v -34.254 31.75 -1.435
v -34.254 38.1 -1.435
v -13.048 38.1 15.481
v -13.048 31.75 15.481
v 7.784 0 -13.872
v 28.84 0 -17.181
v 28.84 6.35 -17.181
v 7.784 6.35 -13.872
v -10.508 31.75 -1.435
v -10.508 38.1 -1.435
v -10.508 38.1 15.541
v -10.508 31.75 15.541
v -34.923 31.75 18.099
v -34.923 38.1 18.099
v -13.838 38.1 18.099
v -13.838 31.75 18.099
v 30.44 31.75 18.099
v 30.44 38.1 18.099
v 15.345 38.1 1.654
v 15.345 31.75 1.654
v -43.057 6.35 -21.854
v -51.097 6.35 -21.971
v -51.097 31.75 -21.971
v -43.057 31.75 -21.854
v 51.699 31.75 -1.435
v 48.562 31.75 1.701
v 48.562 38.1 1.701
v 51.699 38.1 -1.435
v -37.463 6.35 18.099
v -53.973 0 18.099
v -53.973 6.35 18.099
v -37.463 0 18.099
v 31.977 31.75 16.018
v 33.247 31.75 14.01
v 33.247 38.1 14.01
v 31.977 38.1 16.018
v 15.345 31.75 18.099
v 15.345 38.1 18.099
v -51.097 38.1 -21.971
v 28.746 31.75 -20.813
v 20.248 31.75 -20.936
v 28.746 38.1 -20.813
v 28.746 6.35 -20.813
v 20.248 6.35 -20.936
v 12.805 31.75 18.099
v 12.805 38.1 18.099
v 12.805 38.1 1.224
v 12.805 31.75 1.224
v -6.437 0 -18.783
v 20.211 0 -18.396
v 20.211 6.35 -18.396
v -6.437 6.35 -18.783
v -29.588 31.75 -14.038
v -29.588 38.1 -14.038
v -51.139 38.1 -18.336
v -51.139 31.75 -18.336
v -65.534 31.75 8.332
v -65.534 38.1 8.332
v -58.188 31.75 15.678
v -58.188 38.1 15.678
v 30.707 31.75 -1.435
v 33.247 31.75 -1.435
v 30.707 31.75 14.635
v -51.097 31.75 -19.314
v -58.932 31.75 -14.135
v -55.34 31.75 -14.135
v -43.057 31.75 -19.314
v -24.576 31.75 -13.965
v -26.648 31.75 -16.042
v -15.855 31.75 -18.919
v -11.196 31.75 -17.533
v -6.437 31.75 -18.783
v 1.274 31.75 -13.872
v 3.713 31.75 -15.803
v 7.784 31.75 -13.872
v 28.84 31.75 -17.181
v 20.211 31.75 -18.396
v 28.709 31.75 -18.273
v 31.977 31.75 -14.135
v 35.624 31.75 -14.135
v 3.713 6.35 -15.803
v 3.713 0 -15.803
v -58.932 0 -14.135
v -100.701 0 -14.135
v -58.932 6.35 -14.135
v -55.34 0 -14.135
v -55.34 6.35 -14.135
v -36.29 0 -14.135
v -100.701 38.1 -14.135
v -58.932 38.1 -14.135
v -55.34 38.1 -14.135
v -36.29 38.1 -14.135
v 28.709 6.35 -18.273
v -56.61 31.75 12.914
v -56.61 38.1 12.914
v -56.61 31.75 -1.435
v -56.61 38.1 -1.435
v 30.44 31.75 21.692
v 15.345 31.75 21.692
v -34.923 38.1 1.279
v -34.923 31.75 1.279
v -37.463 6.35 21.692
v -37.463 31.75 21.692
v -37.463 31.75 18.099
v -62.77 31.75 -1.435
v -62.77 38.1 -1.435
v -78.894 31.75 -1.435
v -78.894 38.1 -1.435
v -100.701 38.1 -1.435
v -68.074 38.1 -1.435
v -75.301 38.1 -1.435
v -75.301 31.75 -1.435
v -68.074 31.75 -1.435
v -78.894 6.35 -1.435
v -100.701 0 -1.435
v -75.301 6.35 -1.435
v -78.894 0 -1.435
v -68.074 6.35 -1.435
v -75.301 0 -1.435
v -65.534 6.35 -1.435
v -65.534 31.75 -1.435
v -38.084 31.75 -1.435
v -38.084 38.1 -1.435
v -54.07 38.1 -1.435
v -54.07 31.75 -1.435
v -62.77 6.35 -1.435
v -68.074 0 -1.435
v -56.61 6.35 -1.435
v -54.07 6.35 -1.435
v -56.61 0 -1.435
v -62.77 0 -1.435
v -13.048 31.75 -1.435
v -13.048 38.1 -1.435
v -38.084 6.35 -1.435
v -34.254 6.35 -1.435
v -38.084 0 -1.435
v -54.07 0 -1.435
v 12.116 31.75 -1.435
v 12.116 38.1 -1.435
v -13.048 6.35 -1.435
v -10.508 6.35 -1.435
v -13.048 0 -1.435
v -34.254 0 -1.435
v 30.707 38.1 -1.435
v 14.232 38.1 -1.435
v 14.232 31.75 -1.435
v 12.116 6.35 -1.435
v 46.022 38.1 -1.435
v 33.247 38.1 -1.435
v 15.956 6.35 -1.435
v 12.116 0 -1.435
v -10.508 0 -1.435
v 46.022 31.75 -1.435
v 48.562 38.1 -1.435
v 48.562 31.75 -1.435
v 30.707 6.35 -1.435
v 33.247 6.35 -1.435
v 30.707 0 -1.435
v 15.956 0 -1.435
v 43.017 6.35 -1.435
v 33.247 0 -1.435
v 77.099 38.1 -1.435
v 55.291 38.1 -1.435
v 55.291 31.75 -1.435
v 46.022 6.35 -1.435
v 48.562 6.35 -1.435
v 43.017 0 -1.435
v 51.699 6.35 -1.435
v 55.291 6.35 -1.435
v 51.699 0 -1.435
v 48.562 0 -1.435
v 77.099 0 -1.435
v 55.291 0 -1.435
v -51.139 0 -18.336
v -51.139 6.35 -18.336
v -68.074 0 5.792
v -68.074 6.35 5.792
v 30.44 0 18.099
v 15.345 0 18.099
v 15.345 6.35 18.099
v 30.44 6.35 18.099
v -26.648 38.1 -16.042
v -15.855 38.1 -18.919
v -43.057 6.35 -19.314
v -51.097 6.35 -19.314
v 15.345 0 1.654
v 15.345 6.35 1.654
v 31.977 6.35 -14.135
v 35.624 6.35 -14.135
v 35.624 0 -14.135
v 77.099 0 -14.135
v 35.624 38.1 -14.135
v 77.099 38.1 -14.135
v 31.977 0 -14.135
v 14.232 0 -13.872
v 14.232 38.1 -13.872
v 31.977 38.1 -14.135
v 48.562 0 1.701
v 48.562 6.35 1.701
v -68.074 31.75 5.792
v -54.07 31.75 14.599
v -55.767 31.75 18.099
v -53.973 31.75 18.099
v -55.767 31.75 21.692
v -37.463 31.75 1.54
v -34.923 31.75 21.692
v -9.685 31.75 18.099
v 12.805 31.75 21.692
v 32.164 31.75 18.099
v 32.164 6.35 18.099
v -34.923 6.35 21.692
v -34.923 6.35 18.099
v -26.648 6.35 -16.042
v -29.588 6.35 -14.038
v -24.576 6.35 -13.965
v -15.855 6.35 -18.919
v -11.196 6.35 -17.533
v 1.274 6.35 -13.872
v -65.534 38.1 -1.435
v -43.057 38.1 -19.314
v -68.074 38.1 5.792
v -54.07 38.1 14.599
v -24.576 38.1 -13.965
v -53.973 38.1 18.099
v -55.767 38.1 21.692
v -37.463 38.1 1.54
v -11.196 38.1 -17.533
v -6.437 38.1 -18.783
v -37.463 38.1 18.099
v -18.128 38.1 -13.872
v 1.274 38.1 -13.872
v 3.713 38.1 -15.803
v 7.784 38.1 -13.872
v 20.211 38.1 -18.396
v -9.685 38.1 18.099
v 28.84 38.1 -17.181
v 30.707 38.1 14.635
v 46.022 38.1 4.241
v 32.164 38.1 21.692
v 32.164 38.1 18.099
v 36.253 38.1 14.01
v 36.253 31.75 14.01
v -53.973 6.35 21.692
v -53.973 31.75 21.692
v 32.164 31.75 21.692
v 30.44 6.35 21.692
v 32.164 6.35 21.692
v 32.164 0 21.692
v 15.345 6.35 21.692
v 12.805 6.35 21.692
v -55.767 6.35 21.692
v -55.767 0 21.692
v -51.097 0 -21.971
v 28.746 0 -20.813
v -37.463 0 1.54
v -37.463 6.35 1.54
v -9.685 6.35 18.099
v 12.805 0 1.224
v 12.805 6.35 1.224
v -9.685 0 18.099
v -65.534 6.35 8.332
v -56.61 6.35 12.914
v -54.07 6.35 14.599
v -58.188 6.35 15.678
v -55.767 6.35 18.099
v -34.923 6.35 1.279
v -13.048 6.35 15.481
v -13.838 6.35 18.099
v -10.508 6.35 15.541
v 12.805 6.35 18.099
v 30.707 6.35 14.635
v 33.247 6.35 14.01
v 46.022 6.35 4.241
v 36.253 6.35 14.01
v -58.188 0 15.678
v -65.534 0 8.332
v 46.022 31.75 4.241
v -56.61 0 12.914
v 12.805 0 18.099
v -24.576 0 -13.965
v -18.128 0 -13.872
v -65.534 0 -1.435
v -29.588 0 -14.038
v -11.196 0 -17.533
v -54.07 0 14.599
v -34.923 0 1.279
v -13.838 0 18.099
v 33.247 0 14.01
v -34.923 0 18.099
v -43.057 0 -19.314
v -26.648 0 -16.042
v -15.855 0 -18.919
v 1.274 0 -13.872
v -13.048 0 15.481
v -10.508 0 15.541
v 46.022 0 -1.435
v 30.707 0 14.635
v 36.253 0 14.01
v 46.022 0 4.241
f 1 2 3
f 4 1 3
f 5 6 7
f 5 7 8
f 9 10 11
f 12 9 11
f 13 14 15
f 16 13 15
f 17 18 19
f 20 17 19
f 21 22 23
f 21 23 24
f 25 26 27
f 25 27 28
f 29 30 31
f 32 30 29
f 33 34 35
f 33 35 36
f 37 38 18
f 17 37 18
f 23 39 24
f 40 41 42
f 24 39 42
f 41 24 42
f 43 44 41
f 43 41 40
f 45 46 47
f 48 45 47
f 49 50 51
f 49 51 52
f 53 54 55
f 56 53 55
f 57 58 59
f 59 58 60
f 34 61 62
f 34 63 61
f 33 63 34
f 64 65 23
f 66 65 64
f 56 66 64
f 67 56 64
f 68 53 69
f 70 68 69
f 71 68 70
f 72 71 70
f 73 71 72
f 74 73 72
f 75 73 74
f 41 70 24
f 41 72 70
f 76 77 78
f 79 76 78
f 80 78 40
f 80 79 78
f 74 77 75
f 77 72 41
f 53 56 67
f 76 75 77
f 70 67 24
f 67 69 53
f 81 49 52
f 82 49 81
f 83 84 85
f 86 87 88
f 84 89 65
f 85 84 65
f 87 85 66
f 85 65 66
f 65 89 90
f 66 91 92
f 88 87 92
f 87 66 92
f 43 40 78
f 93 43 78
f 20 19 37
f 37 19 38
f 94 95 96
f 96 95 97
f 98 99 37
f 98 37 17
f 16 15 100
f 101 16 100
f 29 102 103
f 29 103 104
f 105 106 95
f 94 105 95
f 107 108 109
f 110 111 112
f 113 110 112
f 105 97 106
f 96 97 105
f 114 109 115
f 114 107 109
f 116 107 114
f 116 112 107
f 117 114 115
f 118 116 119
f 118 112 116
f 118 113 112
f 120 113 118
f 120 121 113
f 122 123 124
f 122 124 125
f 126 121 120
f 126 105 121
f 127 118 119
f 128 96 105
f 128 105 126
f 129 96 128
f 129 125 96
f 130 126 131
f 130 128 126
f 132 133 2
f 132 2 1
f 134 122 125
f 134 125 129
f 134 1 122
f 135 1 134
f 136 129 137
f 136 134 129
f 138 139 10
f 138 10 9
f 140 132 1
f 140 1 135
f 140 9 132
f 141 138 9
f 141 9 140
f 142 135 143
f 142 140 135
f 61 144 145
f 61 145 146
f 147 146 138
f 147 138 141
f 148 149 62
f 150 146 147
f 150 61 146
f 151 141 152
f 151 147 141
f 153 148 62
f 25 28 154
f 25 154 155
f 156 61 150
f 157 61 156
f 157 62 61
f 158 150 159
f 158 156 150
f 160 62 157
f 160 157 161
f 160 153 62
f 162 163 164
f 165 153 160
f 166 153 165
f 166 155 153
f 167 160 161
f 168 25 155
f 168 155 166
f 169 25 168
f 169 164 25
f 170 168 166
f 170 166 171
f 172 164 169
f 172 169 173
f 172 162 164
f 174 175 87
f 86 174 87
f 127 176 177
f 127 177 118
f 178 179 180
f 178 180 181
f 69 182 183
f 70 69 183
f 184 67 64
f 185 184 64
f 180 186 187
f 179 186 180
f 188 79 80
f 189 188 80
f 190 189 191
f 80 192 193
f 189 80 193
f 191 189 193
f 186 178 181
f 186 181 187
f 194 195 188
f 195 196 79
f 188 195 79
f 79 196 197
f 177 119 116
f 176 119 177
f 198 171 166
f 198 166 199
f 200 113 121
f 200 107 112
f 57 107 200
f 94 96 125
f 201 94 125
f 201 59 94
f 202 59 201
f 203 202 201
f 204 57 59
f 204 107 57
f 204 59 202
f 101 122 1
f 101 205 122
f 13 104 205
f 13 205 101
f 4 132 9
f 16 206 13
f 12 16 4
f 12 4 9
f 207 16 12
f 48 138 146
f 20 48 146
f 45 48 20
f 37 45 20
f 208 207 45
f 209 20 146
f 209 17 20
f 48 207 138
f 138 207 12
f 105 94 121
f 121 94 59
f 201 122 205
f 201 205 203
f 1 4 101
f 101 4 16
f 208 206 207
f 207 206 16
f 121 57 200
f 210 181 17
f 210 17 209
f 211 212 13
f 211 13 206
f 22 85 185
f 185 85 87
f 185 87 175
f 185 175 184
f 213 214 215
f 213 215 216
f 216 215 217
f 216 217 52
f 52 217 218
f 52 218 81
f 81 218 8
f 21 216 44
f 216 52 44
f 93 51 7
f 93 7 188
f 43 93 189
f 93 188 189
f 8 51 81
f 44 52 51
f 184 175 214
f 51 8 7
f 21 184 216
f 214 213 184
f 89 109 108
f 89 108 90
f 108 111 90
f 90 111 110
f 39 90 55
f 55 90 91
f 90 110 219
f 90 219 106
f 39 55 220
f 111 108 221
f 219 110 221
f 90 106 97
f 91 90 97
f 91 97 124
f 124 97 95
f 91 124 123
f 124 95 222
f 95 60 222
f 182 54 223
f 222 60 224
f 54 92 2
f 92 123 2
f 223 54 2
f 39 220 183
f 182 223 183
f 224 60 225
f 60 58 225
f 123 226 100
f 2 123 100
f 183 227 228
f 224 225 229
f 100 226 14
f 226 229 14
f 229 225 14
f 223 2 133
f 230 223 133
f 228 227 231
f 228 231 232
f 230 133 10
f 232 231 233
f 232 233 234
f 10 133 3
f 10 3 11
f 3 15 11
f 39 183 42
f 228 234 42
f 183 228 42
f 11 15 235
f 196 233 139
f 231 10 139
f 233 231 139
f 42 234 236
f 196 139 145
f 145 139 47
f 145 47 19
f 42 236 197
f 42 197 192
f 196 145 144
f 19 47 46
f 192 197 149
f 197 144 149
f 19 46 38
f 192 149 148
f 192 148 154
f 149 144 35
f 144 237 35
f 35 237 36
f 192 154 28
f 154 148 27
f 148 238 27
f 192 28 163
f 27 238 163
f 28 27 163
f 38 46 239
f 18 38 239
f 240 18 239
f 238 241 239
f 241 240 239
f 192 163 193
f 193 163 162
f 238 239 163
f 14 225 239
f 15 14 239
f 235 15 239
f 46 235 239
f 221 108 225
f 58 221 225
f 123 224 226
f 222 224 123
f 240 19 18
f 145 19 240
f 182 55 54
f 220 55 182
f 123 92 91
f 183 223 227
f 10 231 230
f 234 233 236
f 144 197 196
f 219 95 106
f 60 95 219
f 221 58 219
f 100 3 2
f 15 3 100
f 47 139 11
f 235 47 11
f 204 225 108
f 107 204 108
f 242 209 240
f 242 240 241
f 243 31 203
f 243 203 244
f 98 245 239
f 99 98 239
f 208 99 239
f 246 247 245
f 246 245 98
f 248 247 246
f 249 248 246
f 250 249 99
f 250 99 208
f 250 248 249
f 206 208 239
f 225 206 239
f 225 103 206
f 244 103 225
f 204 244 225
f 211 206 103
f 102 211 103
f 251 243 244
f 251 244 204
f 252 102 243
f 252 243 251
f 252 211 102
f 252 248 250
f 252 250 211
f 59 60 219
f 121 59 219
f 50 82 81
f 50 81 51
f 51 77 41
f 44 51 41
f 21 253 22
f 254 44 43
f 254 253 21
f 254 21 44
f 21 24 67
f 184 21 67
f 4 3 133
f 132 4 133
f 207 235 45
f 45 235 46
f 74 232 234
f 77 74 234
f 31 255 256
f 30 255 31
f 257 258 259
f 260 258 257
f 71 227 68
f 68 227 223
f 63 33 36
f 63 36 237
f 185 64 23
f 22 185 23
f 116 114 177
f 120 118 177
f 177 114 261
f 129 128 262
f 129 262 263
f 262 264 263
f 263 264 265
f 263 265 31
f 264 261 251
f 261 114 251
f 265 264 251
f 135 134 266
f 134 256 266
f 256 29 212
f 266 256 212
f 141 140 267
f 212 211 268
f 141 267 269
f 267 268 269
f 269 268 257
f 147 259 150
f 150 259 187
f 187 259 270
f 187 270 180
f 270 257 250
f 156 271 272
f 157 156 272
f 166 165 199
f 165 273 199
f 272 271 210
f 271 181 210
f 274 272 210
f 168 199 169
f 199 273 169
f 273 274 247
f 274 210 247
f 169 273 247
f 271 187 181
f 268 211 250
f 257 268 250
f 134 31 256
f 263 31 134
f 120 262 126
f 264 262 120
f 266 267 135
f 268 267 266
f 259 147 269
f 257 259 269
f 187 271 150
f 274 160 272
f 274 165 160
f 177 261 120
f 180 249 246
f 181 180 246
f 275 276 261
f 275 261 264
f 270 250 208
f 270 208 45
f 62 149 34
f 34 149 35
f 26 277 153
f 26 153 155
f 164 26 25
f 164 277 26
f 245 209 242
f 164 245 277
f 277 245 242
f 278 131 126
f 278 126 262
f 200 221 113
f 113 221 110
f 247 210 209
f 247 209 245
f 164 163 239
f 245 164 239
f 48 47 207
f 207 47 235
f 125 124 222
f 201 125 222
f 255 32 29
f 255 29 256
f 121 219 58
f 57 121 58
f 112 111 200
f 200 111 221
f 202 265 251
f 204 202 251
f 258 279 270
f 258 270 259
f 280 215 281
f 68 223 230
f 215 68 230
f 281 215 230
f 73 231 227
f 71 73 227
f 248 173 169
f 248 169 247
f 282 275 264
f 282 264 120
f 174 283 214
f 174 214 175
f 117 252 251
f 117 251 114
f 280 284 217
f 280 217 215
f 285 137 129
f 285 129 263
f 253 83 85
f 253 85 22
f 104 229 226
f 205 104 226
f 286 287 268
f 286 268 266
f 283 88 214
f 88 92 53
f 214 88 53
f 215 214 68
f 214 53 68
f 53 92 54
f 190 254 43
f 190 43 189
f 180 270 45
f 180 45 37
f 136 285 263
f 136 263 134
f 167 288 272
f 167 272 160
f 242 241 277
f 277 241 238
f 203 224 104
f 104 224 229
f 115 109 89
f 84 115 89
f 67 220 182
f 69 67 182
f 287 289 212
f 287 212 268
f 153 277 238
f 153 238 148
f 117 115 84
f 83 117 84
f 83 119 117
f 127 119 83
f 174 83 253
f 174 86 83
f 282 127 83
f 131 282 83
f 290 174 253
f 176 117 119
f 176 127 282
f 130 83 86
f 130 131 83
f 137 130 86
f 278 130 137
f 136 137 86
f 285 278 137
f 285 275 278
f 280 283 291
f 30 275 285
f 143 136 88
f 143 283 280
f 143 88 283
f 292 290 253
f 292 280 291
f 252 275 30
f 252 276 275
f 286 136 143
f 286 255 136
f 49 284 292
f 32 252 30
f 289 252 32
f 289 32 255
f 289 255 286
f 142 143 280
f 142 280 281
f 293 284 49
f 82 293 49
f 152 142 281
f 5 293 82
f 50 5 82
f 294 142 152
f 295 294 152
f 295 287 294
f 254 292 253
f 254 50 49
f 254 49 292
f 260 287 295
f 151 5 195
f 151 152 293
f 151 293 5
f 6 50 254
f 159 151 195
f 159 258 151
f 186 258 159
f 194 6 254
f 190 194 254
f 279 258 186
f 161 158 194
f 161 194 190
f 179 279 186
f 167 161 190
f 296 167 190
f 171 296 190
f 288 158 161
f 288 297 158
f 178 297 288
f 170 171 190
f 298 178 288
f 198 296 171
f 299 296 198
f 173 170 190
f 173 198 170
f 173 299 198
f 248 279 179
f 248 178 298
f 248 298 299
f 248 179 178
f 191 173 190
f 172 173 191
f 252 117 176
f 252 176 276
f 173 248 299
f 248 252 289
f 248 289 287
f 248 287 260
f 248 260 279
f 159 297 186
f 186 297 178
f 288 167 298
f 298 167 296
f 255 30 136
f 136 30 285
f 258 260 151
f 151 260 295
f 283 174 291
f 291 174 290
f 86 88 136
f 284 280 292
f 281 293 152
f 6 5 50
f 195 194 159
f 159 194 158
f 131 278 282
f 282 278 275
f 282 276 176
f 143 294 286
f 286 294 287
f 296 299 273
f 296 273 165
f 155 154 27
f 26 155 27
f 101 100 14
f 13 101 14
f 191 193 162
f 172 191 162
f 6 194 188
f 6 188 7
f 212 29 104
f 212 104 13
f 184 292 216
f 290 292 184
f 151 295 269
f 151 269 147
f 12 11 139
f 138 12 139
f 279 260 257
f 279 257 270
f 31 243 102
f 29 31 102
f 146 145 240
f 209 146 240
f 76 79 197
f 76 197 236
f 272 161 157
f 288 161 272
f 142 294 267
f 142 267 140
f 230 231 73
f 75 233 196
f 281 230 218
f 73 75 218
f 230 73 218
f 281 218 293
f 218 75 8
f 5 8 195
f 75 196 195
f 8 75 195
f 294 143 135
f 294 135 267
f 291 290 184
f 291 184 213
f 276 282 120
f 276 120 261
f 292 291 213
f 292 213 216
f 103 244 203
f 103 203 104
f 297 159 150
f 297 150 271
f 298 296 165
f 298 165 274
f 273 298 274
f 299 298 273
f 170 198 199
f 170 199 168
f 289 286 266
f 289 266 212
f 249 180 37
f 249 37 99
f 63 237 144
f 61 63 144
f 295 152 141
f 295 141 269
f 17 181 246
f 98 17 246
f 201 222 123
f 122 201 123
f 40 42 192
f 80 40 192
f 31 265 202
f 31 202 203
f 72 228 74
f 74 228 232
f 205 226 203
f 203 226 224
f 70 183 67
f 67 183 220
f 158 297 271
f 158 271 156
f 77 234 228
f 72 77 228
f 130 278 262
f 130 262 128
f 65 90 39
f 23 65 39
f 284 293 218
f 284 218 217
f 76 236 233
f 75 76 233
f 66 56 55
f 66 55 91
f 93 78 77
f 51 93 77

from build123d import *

# Parameters (mm, degrees)
F1_DEPTH  = 19.05
F2_DEPTH  = 19.05
F3_DEPTH  = 12.7
F4_DEPTH  = 6.35
F5_DEPTH  = 6.35
F7_DEPTH  = 6.35
F8_DEPTH  = 6.35
F11_DEPTH = 25.4
F12_DEPTH = 25.4
F6_W      = 1.7239038059
F6_H      = 3.5921024484
F6_W_2    = 1.7933621035
F13_DEPTH = 38.1
F14_DEPTH = 6.35


# Not quite as in the source:
# - a feature names something its author has since deleted; it is built from what else it names


with BuildPart() as f1:
    # F0 (on Front) → F1 (new body)
    with BuildSketch(Plane.XZ):
        Polygon((-75.3014223417, -8.4543359262), (-75.3014223417, -1.435443759), (-78.8935247901, -1.435443759), (-100.7014223417, -1.435443759), (-100.7014223417, -14.135443759), (-75.3014223417, -14.135443759), align=None)
    extrude(amount=-F1_DEPTH)

    # F0 (on Front) → F2 (join)
    with BuildSketch(Plane.XZ):
        Polygon((-68.0739664064, -1.435443759), (-75.3014223417, -1.435443759), (-75.3014223417, -8.4543359262), (-75.3014223417, -14.135443759), (-58.9322418971, -14.135443759), (-55.3401394486, -14.135443759), (-55.3401394486, -1.435443759), (-56.6101394486, -1.435443759), (-62.7698475104, -1.435443759), (-64.1519069584, -1.435443759), (-65.5339664064, -1.435443759), align=None)
        Polygon((-55.3401394486, -1.435443759), (-55.3401394486, -14.135443759), (-36.2901394486, -14.135443759), (-36.2901394486, -1.435443759), (-38.0835015521, -1.435443759), (-54.0701394486, -1.435443759), align=None)
        Polygon((-34.2535879934, -1.435443759), (-36.2901394486, -1.435443759), (-36.2901394486, -14.135443759), (-29.5884479715, -14.0381948012), (-24.5761177188, -13.9654603438), (-18.1276498189, -13.8718859402), (-18.1276498189, -1.435443759), align=None)
    extrude(amount=-F2_DEPTH)



with BuildPart() as f1b:
    # F0 (on Front) → F1, piece 2 (new body)
    with BuildSketch(Plane.XZ):
        Polygon((77.0985776583, -1.435443759), (55.2906801068, -1.435443759), (51.6985776583, -1.435443759), (48.562251594, -1.435443759), (46.022251594, -1.435443759), (44.5195358117, -1.435443759), (43.0168200294, -1.435443759), (33.2472785554, -1.435443759), (31.9772785554, -1.435443759), (31.9772785554, -14.135443759), (35.6239399467, -14.135443759), (77.0985776583, -14.135443759), align=None)
    extrude(amount=-F1_DEPTH)

    # F0 (on Front) → F2, piece 2 (join)
    with BuildSketch(Plane.XZ):
        Polygon((14.2324982387, -13.8718859402), (14.2324982387, -1.435443759), (12.1164883202, -1.435443759), (-5.4276498189, -1.435443759), (-5.4276498189, -13.8718859402), (1.2740385811, -13.8718859402), (7.7840224387, -13.8718859402), align=None)
        Polygon((15.9564020446, -1.435443759), (14.2324982387, -1.435443759), (14.2324982387, -13.8718859402), (31.9772785554, -14.135443759), (31.9772785554, -1.435443759), (30.7072785554, -1.435443759), align=None)
        Polygon((77.0985776583, -1.435443759), (55.2906801068, -1.435443759), (51.6985776583, -1.435443759), (48.562251594, -1.435443759), (46.022251594, -1.435443759), (44.5195358117, -1.435443759), (43.0168200294, -1.435443759), (33.2472785554, -1.435443759), (31.9772785554, -1.435443759), (31.9772785554, -14.135443759), (35.6239399467, -14.135443759), (77.0985776583, -14.135443759), align=None)
    extrude(amount=-F2_DEPTH)


with BuildPart() as f1_1:
    add(f1.part)
    # F3 (add, through all): a face of the model
    f3_faces = [f1b.part.faces().sort_by_distance(p)[0] for p in [
        (-5.4276498189, 9.525, -7.6536648496),
    ]]

    add(f1b.part)  # F3 merges F1b
    extrude(f3_faces, amount=F3_DEPTH)

    # F0 (on Front) → F4 (join)
    with BuildSketch(Plane.XZ):
        Polygon((-78.8935247901, -1.435443759), (-75.3014223417, -1.435443759), (-68.0739664064, 5.7920121763), (-65.5339664064, 8.3320121763), (-58.1879977366, 15.6779808461), (-55.7665104711, 18.0994681116), (-53.9731483676, 18.0994681116), (-37.4634148507, 18.0994681116), (-36.1934148507, 18.0994681116), (-34.9234148507, 18.0994681116), (-13.8379737969, 18.0994681116), (-11.8014223417, 18.0994681116), (-9.6854124232, 18.0994681116), (12.8047038004, 18.0994681116), (14.0747038004, 18.0994681116), (15.3447038004, 18.0994681116), (30.4397619819, 18.0994681116), (32.1636657878, 18.0994681116), (36.2527101199, 14.0104237794), (46.022251594, 4.2408823054), (48.562251594, 1.7008823054), (51.6985776583, -1.435443759), (55.2906801068, -1.435443759), (32.1636657878, 21.69157056), (-55.7665104711, 21.69157056), align=None)
        Polygon((-68.0739664064, 5.7920121763), (-68.0739664064, -1.435443759), (-65.5339664064, -1.435443759), (-65.5339664064, 8.3320121763), align=None)
        Polygon((-36.1934148507, 18.0994681116), (-37.4634148507, 18.0994681116), (-37.4634148507, 1.5401106785), (-36.1934148507, 0.2662933926), align=None)
        Polygon((-34.9234148507, 18.0994681116), (-36.1934148507, 18.0994681116), (-36.1934148507, 0.2662933926), (-34.9234148507, 1.2793859922), align=None)
        Polygon((-11.7776498189, 16.4938528035), (-13.0476498189, 15.4807602039), (-13.0476498189, -1.435443759), (-11.7776498189, -1.435443759), align=None)
        Polygon((-10.5076498189, 15.5408907631), (-11.7776498189, 16.4938528035), (-11.7776498189, -1.435443759), (-10.5076498189, -1.435443759), align=None)
        Polygon((15.3447038004, 18.0994681116), (14.0747038004, 18.0994681116), (14.0747038004, 0.2707367444), (15.3447038004, 1.6543241772), align=None)
        Polygon((14.0747038004, 18.0994681116), (12.8047038004, 18.0994681116), (12.8047038004, 1.2236987848), (14.0747038004, 0.2707367444), align=None)
        Polygon((30.7072785554, -1.435443759), (31.9772785554, -1.435443759), (31.9772785554, 16.0183226994), (30.7072785554, 14.6347352666), align=None)
        Polygon((31.9772785554, 16.0183226994), (31.9772785554, -1.435443759), (33.2472785554, -1.435443759), (33.2472785554, 14.0104237794), align=None)
        Polygon((-55.3401394486, 15.8730630517), (-55.3401394486, -1.435443759), (-54.0701394486, -1.435443759), (-54.0701394486, 14.5992457658), align=None)
        Polygon((-56.6101394486, 12.9144267948), (-56.6101394486, -1.435443759), (-55.3401394486, -1.435443759), (-55.3401394486, 15.8730630517), align=None)
    extrude(amount=-F4_DEPTH)

    # F0 (on Front) → F5 (join)
    with BuildSketch(Plane.XZ):
        Polygon((-55.7665104711, 18.0994681116), (-64.1519069584, -1.435443759), (-62.7698475104, -1.435443759), (-56.6101394486, 12.9144267948), (-55.3401394486, 15.8730630517), (-54.0701394486, 14.5992457658), (-38.0835015521, -1.435443759), (-36.2901394486, -1.435443759), align=None)
        Polygon((-58.1879977366, 15.6779808461), (-65.5339664064, -1.435443759), (-64.1519069584, -1.435443759), (-55.7665104711, 18.0994681116), align=None)
        Polygon((-53.9731483676, 18.0994681116), (-55.7665104711, 18.0994681116), (-36.2901394486, -1.435443759), (-11.8014223417, 18.0994681116), (-13.8379737969, 18.0994681116), (-34.9234148507, 1.2793859922), (-36.1934148507, 0.2662933926), (-37.4634148507, 1.5401106785), align=None)
        Polygon((-11.8014223417, 18.0994681116), (-36.2901394486, -1.435443759), (-34.2535879934, -1.435443759), (-13.0476498189, 15.4807602039), (-11.7776498189, 16.4938528035), (-10.5076498189, 15.5408907631), (12.1164883202, -1.435443759), (14.2324982387, -1.435443759), align=None)
        Polygon((-9.6854124232, 18.0994681116), (-11.8014223417, 18.0994681116), (14.2324982387, -1.435443759), (32.1636657878, 18.0994681116), (30.4397619819, 18.0994681116), (15.3447038004, 1.6543241772), (14.0747038004, 0.2707367444), (12.8047038004, 1.2236987848), align=None)
    extrude(amount=-F5_DEPTH)

    # F0 (on Front) → F7 (join)
    with BuildSketch(Plane.XZ):
        Polygon((-55.3401394486, -14.135443759), (-58.9322418971, -14.135443759), (-51.0965817995, -21.9711038566), (28.7455422806, -20.8125063022), (35.6239399467, -14.135443759), (31.9772785554, -14.135443759), (28.8399389893, -17.1809513785), (27.7001179184, -18.2874091537), (20.2112810939, -18.3960804614), (-6.4368105921, -18.782773754), (-11.1798369081, -18.8516003134), (-15.855044379, -18.9194427462), (-43.0566496336, -19.3141681332), (-50.0597917346, -19.415791473), (-51.1394793261, -18.3361038815), align=None)
        Polygon((-26.606417659, -14.7384993405), (-50.0597917346, -19.415791473), (-43.0566496336, -19.3141681332), (-26.647951981, -16.0417915366), (-15.855044379, -18.9194427462), (-11.1798369081, -18.8516003134), align=None)
        Polygon((-29.5884479715, -14.0381948012), (-51.1394793261, -18.3361038815), (-50.0597917346, -19.415791473), (-26.606417659, -14.7384993405), (-11.1798369081, -18.8516003134), (3.6282092287, -14.5043621946), (27.7001179184, -18.2874091537), (28.8399389893, -17.1809513785), (7.7840224387, -13.8718859402), (1.2740385811, -13.8718859402), (-11.1963136804, -17.5328409511), (-24.5761177188, -13.9654603438), align=None)
        Polygon((3.6282092287, -14.5043621946), (-11.1798369081, -18.8516003134), (-6.4368105921, -18.782773754), (3.7125368777, -15.8032023917), (20.2112810939, -18.3960804614), (27.7001179184, -18.2874091537), align=None)
    extrude(amount=-F7_DEPTH)

    # F0 (on Front) → F8 (join)
    with BuildSketch(Plane.XZ):
        Polygon((46.022251594, -1.435443759), (48.562251594, -1.435443759), (48.562251594, 1.7008823054), (46.022251594, 4.2408823054), align=None)
    extrude(amount=-F8_DEPTH)

    # F9: F1 across face


with BuildPart() as f1_2:
    add(f1_1.part)
    add(f1_1.part.mirror(Plane(origin=(-11.8589412224, 19.05, -7.7486185811), x_dir=(-1, 0, 0), z_dir=(0, 1, 0))))

    # F10 (on face) → F11 (join, through all)
    with BuildSketch(Plane.XZ.offset(-31.75)):
        Polygon((20.248135424, -20.9358130769), (28.7455422806, -20.8125063022), (28.7086879505, -18.2727736867), (20.2112810939, -18.3960804614), align=None)
    extrude(amount=F11_DEPTH)

    # F10 (on face) → F12 (join, through all)
    with BuildSketch(Plane.XZ.offset(-31.75)):
        Polygon((-43.0566496336, -21.8544355458), (-43.0566496336, -19.3141681332), (-51.0965817995, -19.3141681332), (-51.0965817995, -19.325645402), (-51.0965817995, -21.9711038566), align=None)
    extrude(amount=F12_DEPTH)

    # F6 (on face) → F13 (join)
    with BuildSketch(Plane.XZ):
        Polygon((15.3447038004, 18.0994681116), (15.3447038004, 21.69157056), (12.8047038004, 21.69157056), (12.8047038004, 18.0994681116), (14.0747038004, 18.0994681116), align=None)
        with Locations((31.3017138849, 19.8955193358)):
            Rectangle(F6_W, F6_H)
        with Locations((-54.8698294194, 19.8955193358)):
            Rectangle(F6_W_2, F6_H)
        Polygon((-34.9234148507, 18.0994681116), (-34.9234148507, 21.69157056), (-37.4634148507, 21.69157056), (-37.4634148507, 18.0994681116), (-36.1934148507, 18.0994681116), align=None)
    extrude(amount=-F13_DEPTH)

    # F0 (on Front) → F14 (join)
    with BuildSketch(Plane.XZ):
        Polygon((32.1636657878, 18.0994681116), (14.2324982387, -1.435443759), (15.9564020446, -1.435443759), (30.7072785554, 14.6347352666), (31.9772785554, 16.0183226994), (33.2472785554, 14.0104237794), (43.0168200294, -1.435443759), (44.5195358117, -1.435443759), align=None)
        Polygon((44.5195358117, -1.435443759), (46.022251594, -1.435443759), (36.2527101199, 14.0104237794), (32.1636657878, 18.0994681116), align=None)
    extrude(amount=-F14_DEPTH)


solid = f1_2.part
